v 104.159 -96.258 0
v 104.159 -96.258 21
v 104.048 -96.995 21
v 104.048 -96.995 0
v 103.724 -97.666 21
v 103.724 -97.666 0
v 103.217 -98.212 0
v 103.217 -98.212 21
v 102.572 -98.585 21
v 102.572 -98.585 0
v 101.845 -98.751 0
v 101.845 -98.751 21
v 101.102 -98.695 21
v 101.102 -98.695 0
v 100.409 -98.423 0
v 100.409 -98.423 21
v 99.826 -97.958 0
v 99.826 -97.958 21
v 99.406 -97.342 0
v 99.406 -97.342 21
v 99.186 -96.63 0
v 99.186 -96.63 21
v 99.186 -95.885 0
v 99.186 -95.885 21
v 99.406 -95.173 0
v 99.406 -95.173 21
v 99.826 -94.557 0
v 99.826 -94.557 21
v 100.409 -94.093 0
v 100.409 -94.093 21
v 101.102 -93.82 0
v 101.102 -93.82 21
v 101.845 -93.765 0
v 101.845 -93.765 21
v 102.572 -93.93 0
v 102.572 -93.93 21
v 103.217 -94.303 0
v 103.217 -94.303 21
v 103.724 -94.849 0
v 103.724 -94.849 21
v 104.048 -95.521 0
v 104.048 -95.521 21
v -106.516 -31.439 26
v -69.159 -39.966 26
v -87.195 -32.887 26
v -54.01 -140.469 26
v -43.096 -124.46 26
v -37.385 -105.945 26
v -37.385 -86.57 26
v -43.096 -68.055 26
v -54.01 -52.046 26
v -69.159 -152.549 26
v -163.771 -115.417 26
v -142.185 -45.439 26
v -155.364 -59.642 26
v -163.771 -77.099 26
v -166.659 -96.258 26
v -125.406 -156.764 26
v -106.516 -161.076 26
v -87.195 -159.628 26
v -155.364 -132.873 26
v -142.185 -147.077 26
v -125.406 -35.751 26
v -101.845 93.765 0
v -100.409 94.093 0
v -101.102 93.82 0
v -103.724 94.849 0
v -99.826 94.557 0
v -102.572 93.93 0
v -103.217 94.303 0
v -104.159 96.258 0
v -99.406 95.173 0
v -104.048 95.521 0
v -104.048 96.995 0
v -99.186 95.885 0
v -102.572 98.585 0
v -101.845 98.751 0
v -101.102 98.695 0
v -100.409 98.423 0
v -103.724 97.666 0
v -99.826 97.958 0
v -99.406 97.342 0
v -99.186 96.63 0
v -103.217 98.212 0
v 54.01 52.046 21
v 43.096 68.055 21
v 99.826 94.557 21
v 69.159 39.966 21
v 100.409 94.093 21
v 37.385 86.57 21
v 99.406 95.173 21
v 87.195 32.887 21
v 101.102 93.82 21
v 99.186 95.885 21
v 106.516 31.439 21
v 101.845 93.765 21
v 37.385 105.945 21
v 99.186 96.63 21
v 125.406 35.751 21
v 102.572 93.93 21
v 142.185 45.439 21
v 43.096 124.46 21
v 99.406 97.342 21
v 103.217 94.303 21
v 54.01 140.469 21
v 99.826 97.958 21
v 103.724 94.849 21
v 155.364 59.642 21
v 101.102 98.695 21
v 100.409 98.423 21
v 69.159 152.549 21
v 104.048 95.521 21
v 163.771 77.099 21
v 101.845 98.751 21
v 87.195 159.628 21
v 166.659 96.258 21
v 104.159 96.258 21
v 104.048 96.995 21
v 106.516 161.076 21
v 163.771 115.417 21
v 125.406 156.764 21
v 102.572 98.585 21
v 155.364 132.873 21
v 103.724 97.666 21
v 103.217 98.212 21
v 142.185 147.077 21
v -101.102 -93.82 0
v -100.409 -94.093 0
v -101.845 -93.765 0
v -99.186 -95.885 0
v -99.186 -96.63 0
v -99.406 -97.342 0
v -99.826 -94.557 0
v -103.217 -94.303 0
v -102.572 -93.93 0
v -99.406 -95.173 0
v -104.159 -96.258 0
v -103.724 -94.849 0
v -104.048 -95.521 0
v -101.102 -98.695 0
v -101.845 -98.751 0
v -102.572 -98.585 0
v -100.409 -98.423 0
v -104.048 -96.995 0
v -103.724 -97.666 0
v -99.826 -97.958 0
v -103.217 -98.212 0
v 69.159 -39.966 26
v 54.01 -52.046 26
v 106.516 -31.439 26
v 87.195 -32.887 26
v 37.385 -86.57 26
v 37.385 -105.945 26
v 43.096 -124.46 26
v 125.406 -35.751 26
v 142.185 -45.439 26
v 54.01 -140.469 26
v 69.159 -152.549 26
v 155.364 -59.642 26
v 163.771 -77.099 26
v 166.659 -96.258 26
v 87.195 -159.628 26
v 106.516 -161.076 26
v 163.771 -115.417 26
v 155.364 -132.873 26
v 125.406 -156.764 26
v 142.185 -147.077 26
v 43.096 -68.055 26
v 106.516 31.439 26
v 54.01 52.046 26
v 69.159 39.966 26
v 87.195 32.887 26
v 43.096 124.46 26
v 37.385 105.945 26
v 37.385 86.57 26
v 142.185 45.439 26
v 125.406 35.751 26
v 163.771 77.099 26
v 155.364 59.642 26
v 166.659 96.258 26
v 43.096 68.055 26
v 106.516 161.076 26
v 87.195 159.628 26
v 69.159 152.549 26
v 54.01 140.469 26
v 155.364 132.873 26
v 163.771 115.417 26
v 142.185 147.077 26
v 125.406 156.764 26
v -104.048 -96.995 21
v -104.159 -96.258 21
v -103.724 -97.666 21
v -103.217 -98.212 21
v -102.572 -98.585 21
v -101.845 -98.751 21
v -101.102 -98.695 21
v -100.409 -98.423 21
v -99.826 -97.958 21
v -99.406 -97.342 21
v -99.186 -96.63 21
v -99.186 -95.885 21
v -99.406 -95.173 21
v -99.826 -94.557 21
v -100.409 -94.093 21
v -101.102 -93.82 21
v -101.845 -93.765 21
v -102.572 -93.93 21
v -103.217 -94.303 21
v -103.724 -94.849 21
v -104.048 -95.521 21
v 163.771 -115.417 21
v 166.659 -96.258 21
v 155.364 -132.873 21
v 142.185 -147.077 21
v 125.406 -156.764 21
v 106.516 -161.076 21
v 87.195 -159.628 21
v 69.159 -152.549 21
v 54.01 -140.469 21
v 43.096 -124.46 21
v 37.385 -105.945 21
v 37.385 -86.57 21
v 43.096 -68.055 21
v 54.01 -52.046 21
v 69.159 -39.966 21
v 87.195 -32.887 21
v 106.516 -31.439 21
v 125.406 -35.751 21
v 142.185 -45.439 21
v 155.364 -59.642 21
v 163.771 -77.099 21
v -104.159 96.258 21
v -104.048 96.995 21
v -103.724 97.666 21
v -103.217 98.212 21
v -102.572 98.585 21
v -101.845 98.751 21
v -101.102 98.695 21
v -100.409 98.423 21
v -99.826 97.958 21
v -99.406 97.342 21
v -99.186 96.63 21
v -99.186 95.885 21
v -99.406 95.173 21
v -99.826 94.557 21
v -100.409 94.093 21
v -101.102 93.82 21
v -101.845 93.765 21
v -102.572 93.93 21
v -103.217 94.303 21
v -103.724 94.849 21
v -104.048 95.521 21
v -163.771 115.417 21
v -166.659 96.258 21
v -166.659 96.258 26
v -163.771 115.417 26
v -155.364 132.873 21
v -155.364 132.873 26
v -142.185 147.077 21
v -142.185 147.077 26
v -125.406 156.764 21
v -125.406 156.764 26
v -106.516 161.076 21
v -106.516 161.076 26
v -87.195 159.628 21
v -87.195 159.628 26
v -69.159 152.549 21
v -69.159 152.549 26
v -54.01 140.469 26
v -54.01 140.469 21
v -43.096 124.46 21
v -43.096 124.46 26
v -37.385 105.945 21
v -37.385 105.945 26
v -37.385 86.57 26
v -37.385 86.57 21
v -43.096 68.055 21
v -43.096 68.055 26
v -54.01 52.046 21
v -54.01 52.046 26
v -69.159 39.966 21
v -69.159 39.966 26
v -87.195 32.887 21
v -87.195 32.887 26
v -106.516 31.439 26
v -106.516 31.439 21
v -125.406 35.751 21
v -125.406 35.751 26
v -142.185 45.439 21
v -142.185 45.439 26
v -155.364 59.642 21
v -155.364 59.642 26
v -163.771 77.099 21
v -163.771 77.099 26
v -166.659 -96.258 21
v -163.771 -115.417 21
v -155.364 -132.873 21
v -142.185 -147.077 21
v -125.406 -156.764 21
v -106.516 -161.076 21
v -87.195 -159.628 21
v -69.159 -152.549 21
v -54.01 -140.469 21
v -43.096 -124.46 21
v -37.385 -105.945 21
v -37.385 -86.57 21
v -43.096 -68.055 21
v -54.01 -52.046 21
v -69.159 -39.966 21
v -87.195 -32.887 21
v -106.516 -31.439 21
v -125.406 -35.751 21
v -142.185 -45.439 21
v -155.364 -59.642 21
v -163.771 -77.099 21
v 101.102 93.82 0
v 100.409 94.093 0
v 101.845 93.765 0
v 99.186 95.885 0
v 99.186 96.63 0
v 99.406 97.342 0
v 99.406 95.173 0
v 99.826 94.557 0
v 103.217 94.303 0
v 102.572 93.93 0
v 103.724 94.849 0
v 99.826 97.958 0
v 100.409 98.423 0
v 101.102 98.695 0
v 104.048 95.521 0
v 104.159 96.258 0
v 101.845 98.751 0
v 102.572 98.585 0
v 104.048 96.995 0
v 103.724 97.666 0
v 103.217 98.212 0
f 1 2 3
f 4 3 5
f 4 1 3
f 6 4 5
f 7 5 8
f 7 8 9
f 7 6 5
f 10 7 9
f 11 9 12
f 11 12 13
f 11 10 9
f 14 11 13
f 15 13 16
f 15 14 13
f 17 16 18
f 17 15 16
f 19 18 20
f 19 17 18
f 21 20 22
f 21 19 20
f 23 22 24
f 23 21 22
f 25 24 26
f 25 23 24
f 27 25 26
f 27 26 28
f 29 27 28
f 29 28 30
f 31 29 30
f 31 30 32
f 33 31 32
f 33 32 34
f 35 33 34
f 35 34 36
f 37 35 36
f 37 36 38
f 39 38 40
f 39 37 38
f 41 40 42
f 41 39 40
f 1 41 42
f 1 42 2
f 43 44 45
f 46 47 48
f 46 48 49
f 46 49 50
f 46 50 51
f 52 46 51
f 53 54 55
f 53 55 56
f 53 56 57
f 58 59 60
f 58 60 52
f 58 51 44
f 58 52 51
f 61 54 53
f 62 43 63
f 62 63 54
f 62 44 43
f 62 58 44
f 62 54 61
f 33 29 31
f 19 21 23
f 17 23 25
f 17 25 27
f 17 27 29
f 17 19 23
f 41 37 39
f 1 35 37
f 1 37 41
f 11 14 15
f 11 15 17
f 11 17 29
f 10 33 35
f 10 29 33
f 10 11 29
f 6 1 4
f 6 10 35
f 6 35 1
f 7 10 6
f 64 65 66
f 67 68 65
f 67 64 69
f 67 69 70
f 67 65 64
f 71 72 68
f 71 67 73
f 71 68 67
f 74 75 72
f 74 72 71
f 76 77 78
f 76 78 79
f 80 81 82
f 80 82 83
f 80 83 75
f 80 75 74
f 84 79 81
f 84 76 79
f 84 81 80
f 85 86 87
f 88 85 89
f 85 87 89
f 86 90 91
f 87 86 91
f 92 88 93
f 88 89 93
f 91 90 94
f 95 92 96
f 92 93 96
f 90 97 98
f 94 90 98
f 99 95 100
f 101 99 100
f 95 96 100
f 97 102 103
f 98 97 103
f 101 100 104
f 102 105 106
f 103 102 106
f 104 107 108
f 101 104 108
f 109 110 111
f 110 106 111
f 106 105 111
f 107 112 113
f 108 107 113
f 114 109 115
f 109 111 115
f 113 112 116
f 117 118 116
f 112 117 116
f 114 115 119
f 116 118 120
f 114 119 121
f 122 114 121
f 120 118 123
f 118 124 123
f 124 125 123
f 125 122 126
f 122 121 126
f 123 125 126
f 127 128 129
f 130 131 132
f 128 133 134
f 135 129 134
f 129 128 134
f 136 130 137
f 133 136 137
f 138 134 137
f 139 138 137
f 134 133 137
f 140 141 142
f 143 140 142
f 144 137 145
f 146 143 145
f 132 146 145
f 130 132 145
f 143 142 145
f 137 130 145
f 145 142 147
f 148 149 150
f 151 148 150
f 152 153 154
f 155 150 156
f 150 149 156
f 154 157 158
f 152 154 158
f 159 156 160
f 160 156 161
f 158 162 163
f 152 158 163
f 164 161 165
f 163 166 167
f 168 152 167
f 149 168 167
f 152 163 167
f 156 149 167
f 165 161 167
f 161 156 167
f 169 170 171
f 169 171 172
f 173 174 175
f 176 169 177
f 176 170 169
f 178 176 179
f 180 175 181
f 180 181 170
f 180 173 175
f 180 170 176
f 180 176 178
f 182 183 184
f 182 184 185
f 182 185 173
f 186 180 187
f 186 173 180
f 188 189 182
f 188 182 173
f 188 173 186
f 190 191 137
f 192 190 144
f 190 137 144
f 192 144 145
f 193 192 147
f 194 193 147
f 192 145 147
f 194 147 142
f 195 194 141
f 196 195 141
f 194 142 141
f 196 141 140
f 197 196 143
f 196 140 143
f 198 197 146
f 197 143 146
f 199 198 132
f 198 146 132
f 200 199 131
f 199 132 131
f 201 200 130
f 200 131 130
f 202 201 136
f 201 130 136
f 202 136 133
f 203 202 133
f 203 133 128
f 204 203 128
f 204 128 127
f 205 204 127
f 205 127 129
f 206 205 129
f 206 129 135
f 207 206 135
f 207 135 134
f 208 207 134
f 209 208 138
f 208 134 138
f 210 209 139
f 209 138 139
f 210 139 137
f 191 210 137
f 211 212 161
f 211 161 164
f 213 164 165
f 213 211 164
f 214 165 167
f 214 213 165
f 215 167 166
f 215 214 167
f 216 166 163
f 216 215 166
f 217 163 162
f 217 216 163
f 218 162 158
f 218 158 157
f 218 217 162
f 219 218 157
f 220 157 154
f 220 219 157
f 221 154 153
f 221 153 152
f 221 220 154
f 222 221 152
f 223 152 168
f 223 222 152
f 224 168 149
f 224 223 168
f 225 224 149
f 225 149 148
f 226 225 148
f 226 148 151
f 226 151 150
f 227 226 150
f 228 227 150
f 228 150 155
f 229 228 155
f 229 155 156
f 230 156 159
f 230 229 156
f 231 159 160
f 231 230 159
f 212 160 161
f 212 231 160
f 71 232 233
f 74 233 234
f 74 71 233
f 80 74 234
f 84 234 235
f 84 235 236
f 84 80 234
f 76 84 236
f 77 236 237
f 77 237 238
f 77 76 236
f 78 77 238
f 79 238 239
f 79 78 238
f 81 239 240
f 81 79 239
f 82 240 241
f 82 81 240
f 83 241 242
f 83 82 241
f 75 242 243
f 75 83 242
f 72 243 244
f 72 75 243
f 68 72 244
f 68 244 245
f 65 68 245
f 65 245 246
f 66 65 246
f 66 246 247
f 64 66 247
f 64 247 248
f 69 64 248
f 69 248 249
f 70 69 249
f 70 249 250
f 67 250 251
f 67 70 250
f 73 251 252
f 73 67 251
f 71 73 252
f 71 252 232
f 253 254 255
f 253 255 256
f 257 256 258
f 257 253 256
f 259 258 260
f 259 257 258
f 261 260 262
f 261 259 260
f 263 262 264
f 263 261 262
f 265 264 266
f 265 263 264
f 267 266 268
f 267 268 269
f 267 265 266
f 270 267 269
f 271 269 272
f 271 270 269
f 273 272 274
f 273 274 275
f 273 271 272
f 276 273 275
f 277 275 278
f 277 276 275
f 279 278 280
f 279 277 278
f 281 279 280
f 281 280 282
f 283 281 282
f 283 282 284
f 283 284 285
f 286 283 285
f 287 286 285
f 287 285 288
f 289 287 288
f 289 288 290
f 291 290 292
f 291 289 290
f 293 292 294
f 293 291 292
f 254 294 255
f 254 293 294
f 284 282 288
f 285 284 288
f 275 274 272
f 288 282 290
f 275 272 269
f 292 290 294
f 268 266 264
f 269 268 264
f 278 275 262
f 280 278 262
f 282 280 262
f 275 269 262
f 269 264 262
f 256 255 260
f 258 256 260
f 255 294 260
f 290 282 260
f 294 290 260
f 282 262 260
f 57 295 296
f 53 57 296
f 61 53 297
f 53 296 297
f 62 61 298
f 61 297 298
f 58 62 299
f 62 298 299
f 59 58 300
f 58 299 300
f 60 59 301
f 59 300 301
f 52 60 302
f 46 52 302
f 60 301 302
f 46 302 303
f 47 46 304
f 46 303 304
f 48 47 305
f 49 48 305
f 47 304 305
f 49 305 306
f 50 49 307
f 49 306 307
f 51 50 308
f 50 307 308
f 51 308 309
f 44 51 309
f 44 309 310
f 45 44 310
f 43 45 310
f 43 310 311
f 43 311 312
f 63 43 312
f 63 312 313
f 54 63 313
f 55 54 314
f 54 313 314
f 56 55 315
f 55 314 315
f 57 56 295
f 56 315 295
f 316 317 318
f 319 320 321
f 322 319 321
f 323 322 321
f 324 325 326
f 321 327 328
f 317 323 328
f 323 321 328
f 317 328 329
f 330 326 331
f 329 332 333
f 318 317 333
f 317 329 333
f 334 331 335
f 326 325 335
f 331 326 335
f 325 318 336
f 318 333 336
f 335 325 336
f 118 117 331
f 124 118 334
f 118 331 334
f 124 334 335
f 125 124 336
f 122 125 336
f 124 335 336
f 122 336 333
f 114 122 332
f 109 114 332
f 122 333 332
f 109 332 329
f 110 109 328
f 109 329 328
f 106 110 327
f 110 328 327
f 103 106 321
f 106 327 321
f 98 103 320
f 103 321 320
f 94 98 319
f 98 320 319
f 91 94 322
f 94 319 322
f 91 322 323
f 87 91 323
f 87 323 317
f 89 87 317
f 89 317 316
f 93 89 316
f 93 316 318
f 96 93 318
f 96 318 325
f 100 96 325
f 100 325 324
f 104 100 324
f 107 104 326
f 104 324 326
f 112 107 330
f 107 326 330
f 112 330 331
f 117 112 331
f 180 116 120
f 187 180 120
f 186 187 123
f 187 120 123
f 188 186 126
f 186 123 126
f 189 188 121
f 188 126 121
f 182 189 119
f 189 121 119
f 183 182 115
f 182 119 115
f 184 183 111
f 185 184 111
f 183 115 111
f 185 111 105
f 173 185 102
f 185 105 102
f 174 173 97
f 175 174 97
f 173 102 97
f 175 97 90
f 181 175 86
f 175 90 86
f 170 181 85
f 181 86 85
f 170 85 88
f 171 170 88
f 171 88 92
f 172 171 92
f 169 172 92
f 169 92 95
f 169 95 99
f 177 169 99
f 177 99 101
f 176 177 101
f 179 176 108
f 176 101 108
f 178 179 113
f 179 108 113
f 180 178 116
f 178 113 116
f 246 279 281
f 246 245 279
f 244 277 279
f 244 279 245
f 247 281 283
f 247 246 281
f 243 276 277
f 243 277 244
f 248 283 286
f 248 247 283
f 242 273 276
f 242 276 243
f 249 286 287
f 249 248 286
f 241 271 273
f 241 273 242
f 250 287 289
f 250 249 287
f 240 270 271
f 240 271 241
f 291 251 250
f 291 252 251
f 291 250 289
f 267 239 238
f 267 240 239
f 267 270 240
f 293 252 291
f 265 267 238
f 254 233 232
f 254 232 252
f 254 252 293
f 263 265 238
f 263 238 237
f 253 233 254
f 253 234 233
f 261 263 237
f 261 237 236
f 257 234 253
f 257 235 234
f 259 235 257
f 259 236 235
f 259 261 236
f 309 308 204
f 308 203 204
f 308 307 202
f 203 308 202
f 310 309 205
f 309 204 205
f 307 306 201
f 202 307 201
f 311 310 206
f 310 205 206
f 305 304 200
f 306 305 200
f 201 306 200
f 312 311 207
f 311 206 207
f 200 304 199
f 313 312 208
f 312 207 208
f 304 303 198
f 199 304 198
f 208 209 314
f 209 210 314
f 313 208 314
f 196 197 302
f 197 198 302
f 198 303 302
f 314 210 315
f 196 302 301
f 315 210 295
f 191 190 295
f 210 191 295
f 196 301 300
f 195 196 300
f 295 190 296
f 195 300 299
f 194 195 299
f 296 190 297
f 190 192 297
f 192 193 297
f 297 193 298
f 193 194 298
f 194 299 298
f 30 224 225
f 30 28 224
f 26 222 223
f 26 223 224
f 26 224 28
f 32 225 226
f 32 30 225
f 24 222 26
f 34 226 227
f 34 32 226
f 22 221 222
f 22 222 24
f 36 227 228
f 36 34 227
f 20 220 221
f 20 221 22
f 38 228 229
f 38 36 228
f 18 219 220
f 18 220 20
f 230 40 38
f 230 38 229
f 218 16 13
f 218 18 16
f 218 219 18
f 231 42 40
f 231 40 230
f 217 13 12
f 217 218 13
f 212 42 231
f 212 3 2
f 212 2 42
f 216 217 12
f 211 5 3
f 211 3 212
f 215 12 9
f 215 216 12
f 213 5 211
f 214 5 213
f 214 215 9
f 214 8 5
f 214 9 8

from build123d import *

# Parameters (mm, degrees)
F0_R     = 2.5
F1_DEPTH = 21
F2_R     = 65
F3_DEPTH = 5


with BuildPart() as f1:
    # F0 (on Top) → F1 (new body)
    with BuildSketch(Plane.XY):
        with Locations((101.658577, 96.257643)):
            Circle(F0_R)
    extrude(amount=F1_DEPTH)

    # F2 (on face) → F3 (join)
    with BuildSketch(Plane.XY.offset(21)):
        with Locations((101.658577, 96.257643)):
            Circle(F2_R)
    extrude(amount=F3_DEPTH)


with BuildPart() as f4_1:
    # F4: instance of F1
    add(f1.part.mirror(Plane.YZ))


with BuildPart() as f5_1:
    # F5: instance of F4_1
    add(f4_1.part.mirror(Plane.XZ))


with BuildPart() as f5_2:
    # F5: instance of F1
    add(f1.part.mirror(Plane.XZ))


solid = Compound([f1.part, f4_1.part, f5_1.part, f5_2.part])
